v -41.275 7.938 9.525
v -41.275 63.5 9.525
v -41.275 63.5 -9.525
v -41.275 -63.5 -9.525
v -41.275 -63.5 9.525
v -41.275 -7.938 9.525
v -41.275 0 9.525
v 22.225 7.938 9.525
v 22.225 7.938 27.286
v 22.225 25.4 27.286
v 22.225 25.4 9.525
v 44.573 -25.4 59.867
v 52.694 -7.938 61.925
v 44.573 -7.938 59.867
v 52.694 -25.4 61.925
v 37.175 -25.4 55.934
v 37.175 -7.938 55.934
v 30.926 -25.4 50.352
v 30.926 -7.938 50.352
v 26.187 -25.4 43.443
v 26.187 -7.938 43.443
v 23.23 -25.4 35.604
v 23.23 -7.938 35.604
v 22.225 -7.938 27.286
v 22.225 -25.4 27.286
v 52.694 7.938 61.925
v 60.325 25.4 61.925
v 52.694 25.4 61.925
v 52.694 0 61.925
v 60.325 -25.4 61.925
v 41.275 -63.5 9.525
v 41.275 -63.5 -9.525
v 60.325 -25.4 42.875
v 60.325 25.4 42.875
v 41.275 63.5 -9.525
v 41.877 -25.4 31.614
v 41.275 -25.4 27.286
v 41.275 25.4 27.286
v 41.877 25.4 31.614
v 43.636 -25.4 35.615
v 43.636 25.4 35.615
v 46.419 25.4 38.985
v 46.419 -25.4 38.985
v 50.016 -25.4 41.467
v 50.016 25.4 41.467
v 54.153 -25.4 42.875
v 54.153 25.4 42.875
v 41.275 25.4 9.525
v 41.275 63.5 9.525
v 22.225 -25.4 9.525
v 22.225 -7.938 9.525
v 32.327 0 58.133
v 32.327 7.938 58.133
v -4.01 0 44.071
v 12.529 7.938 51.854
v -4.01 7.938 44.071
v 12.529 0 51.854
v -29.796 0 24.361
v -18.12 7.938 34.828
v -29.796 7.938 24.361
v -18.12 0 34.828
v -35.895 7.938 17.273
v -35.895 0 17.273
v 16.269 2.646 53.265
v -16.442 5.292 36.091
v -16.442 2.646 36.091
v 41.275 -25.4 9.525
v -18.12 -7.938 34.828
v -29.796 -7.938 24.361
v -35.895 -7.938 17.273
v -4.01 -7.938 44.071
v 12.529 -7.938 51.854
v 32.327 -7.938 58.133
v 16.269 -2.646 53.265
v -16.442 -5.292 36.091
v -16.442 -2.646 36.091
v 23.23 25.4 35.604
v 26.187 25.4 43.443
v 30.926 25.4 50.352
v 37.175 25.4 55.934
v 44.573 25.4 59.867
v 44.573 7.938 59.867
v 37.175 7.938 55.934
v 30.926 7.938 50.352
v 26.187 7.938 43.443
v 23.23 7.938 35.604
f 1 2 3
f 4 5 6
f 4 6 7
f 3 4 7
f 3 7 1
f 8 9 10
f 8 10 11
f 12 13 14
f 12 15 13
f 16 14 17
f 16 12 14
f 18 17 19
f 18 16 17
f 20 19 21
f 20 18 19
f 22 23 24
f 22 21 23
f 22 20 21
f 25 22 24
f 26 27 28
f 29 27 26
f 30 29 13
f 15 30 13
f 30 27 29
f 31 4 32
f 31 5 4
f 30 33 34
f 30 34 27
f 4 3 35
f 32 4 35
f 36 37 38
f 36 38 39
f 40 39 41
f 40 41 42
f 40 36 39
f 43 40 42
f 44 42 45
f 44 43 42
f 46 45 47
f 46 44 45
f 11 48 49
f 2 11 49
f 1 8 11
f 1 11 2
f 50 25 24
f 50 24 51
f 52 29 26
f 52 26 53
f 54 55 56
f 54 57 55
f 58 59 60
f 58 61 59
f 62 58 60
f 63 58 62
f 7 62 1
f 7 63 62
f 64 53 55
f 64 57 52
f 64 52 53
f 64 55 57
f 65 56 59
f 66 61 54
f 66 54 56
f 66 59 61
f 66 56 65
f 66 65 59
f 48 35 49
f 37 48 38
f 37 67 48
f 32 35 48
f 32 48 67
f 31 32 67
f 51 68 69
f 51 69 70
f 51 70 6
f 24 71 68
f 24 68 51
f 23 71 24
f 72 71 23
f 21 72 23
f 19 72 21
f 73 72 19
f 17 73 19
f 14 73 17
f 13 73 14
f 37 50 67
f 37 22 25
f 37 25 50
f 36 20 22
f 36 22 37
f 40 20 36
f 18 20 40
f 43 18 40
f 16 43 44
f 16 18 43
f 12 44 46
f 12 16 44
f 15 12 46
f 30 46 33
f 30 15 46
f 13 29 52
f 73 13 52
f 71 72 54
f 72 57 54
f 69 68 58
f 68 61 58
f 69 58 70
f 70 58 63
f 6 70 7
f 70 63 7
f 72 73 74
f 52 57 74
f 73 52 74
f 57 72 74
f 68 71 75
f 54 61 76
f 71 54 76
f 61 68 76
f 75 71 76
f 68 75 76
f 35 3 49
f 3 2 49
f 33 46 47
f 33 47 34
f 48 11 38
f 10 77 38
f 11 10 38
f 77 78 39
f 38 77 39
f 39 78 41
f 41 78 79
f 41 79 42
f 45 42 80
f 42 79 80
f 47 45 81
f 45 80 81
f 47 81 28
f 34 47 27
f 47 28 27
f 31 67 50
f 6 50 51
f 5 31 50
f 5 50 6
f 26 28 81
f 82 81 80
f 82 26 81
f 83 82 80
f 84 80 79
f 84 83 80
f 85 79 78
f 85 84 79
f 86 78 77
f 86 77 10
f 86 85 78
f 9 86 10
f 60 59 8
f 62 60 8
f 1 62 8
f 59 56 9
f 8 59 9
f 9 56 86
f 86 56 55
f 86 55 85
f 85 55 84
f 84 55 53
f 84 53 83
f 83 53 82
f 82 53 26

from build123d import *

# Parameters (mm, degrees)
F1_DEPTH = 63.5
F2_DEPTH = 25.4
F3_DEPTH = 7.9375


with BuildPart() as f1:
    # F0 (on Front) → F1 (new body, symmetric)
    with BuildSketch(Plane.XZ):
        Polygon((-41.275, -9.525), (41.275, -9.525), (41.275, 9.525), (22.225, 9.525), (-41.275, 9.525), align=None)
    extrude(amount=F1_DEPTH, both=True)

    # F0 (on Front) → F2 (join, symmetric)
    with BuildSketch(Plane.XZ):
        with BuildLine():
            Line((22.225, 9.525), (41.275, 9.525))
            Line((41.275, 9.525), (41.275, 27.2855908291))
            ThreePointArc((41.275, 27.2855908291), (44.9109862911, 37.3960887611), (54.1533834246, 42.8752))
            Line((54.1533834246, 42.8752), (60.325, 42.8752))
            Line((60.325, 42.8752), (60.325, 61.9252))
            Line((60.325, 61.9252), (52.6943180668, 61.9252))
            ThreePointArc((52.6943180668, 61.9252), (30.926248204, 50.3522435282), (22.225, 27.2855908291))
            Line((22.225, 27.2855908291), (22.225, 9.525))
        make_face()
    extrude(amount=F2_DEPTH, both=True)

    # F0 (on Front) → F3 (join, symmetric)
    with BuildSketch(Plane.XZ):
        with BuildLine():
            add(Edge.make_bspline(
                [(52.6943180668, 61.9252), (15.7995279878, 57.229410857), (-21.768245846, 41.0787798464), (-41.275, 9.525)],
                knots=[0, 0, 0, 0, 107.5918849076, 107.5918849076, 107.5918849076, 107.5918849076], degree=3))
            Line((-41.275, 9.525), (22.225, 9.525))
            Line((22.225, 9.525), (22.225, 27.2855908291))
            ThreePointArc((22.225, 27.2855908291), (30.926248204, 50.3522435282), (52.6943180668, 61.9252))
        make_face()
    extrude(amount=F3_DEPTH, both=True)


solid = f1.part
